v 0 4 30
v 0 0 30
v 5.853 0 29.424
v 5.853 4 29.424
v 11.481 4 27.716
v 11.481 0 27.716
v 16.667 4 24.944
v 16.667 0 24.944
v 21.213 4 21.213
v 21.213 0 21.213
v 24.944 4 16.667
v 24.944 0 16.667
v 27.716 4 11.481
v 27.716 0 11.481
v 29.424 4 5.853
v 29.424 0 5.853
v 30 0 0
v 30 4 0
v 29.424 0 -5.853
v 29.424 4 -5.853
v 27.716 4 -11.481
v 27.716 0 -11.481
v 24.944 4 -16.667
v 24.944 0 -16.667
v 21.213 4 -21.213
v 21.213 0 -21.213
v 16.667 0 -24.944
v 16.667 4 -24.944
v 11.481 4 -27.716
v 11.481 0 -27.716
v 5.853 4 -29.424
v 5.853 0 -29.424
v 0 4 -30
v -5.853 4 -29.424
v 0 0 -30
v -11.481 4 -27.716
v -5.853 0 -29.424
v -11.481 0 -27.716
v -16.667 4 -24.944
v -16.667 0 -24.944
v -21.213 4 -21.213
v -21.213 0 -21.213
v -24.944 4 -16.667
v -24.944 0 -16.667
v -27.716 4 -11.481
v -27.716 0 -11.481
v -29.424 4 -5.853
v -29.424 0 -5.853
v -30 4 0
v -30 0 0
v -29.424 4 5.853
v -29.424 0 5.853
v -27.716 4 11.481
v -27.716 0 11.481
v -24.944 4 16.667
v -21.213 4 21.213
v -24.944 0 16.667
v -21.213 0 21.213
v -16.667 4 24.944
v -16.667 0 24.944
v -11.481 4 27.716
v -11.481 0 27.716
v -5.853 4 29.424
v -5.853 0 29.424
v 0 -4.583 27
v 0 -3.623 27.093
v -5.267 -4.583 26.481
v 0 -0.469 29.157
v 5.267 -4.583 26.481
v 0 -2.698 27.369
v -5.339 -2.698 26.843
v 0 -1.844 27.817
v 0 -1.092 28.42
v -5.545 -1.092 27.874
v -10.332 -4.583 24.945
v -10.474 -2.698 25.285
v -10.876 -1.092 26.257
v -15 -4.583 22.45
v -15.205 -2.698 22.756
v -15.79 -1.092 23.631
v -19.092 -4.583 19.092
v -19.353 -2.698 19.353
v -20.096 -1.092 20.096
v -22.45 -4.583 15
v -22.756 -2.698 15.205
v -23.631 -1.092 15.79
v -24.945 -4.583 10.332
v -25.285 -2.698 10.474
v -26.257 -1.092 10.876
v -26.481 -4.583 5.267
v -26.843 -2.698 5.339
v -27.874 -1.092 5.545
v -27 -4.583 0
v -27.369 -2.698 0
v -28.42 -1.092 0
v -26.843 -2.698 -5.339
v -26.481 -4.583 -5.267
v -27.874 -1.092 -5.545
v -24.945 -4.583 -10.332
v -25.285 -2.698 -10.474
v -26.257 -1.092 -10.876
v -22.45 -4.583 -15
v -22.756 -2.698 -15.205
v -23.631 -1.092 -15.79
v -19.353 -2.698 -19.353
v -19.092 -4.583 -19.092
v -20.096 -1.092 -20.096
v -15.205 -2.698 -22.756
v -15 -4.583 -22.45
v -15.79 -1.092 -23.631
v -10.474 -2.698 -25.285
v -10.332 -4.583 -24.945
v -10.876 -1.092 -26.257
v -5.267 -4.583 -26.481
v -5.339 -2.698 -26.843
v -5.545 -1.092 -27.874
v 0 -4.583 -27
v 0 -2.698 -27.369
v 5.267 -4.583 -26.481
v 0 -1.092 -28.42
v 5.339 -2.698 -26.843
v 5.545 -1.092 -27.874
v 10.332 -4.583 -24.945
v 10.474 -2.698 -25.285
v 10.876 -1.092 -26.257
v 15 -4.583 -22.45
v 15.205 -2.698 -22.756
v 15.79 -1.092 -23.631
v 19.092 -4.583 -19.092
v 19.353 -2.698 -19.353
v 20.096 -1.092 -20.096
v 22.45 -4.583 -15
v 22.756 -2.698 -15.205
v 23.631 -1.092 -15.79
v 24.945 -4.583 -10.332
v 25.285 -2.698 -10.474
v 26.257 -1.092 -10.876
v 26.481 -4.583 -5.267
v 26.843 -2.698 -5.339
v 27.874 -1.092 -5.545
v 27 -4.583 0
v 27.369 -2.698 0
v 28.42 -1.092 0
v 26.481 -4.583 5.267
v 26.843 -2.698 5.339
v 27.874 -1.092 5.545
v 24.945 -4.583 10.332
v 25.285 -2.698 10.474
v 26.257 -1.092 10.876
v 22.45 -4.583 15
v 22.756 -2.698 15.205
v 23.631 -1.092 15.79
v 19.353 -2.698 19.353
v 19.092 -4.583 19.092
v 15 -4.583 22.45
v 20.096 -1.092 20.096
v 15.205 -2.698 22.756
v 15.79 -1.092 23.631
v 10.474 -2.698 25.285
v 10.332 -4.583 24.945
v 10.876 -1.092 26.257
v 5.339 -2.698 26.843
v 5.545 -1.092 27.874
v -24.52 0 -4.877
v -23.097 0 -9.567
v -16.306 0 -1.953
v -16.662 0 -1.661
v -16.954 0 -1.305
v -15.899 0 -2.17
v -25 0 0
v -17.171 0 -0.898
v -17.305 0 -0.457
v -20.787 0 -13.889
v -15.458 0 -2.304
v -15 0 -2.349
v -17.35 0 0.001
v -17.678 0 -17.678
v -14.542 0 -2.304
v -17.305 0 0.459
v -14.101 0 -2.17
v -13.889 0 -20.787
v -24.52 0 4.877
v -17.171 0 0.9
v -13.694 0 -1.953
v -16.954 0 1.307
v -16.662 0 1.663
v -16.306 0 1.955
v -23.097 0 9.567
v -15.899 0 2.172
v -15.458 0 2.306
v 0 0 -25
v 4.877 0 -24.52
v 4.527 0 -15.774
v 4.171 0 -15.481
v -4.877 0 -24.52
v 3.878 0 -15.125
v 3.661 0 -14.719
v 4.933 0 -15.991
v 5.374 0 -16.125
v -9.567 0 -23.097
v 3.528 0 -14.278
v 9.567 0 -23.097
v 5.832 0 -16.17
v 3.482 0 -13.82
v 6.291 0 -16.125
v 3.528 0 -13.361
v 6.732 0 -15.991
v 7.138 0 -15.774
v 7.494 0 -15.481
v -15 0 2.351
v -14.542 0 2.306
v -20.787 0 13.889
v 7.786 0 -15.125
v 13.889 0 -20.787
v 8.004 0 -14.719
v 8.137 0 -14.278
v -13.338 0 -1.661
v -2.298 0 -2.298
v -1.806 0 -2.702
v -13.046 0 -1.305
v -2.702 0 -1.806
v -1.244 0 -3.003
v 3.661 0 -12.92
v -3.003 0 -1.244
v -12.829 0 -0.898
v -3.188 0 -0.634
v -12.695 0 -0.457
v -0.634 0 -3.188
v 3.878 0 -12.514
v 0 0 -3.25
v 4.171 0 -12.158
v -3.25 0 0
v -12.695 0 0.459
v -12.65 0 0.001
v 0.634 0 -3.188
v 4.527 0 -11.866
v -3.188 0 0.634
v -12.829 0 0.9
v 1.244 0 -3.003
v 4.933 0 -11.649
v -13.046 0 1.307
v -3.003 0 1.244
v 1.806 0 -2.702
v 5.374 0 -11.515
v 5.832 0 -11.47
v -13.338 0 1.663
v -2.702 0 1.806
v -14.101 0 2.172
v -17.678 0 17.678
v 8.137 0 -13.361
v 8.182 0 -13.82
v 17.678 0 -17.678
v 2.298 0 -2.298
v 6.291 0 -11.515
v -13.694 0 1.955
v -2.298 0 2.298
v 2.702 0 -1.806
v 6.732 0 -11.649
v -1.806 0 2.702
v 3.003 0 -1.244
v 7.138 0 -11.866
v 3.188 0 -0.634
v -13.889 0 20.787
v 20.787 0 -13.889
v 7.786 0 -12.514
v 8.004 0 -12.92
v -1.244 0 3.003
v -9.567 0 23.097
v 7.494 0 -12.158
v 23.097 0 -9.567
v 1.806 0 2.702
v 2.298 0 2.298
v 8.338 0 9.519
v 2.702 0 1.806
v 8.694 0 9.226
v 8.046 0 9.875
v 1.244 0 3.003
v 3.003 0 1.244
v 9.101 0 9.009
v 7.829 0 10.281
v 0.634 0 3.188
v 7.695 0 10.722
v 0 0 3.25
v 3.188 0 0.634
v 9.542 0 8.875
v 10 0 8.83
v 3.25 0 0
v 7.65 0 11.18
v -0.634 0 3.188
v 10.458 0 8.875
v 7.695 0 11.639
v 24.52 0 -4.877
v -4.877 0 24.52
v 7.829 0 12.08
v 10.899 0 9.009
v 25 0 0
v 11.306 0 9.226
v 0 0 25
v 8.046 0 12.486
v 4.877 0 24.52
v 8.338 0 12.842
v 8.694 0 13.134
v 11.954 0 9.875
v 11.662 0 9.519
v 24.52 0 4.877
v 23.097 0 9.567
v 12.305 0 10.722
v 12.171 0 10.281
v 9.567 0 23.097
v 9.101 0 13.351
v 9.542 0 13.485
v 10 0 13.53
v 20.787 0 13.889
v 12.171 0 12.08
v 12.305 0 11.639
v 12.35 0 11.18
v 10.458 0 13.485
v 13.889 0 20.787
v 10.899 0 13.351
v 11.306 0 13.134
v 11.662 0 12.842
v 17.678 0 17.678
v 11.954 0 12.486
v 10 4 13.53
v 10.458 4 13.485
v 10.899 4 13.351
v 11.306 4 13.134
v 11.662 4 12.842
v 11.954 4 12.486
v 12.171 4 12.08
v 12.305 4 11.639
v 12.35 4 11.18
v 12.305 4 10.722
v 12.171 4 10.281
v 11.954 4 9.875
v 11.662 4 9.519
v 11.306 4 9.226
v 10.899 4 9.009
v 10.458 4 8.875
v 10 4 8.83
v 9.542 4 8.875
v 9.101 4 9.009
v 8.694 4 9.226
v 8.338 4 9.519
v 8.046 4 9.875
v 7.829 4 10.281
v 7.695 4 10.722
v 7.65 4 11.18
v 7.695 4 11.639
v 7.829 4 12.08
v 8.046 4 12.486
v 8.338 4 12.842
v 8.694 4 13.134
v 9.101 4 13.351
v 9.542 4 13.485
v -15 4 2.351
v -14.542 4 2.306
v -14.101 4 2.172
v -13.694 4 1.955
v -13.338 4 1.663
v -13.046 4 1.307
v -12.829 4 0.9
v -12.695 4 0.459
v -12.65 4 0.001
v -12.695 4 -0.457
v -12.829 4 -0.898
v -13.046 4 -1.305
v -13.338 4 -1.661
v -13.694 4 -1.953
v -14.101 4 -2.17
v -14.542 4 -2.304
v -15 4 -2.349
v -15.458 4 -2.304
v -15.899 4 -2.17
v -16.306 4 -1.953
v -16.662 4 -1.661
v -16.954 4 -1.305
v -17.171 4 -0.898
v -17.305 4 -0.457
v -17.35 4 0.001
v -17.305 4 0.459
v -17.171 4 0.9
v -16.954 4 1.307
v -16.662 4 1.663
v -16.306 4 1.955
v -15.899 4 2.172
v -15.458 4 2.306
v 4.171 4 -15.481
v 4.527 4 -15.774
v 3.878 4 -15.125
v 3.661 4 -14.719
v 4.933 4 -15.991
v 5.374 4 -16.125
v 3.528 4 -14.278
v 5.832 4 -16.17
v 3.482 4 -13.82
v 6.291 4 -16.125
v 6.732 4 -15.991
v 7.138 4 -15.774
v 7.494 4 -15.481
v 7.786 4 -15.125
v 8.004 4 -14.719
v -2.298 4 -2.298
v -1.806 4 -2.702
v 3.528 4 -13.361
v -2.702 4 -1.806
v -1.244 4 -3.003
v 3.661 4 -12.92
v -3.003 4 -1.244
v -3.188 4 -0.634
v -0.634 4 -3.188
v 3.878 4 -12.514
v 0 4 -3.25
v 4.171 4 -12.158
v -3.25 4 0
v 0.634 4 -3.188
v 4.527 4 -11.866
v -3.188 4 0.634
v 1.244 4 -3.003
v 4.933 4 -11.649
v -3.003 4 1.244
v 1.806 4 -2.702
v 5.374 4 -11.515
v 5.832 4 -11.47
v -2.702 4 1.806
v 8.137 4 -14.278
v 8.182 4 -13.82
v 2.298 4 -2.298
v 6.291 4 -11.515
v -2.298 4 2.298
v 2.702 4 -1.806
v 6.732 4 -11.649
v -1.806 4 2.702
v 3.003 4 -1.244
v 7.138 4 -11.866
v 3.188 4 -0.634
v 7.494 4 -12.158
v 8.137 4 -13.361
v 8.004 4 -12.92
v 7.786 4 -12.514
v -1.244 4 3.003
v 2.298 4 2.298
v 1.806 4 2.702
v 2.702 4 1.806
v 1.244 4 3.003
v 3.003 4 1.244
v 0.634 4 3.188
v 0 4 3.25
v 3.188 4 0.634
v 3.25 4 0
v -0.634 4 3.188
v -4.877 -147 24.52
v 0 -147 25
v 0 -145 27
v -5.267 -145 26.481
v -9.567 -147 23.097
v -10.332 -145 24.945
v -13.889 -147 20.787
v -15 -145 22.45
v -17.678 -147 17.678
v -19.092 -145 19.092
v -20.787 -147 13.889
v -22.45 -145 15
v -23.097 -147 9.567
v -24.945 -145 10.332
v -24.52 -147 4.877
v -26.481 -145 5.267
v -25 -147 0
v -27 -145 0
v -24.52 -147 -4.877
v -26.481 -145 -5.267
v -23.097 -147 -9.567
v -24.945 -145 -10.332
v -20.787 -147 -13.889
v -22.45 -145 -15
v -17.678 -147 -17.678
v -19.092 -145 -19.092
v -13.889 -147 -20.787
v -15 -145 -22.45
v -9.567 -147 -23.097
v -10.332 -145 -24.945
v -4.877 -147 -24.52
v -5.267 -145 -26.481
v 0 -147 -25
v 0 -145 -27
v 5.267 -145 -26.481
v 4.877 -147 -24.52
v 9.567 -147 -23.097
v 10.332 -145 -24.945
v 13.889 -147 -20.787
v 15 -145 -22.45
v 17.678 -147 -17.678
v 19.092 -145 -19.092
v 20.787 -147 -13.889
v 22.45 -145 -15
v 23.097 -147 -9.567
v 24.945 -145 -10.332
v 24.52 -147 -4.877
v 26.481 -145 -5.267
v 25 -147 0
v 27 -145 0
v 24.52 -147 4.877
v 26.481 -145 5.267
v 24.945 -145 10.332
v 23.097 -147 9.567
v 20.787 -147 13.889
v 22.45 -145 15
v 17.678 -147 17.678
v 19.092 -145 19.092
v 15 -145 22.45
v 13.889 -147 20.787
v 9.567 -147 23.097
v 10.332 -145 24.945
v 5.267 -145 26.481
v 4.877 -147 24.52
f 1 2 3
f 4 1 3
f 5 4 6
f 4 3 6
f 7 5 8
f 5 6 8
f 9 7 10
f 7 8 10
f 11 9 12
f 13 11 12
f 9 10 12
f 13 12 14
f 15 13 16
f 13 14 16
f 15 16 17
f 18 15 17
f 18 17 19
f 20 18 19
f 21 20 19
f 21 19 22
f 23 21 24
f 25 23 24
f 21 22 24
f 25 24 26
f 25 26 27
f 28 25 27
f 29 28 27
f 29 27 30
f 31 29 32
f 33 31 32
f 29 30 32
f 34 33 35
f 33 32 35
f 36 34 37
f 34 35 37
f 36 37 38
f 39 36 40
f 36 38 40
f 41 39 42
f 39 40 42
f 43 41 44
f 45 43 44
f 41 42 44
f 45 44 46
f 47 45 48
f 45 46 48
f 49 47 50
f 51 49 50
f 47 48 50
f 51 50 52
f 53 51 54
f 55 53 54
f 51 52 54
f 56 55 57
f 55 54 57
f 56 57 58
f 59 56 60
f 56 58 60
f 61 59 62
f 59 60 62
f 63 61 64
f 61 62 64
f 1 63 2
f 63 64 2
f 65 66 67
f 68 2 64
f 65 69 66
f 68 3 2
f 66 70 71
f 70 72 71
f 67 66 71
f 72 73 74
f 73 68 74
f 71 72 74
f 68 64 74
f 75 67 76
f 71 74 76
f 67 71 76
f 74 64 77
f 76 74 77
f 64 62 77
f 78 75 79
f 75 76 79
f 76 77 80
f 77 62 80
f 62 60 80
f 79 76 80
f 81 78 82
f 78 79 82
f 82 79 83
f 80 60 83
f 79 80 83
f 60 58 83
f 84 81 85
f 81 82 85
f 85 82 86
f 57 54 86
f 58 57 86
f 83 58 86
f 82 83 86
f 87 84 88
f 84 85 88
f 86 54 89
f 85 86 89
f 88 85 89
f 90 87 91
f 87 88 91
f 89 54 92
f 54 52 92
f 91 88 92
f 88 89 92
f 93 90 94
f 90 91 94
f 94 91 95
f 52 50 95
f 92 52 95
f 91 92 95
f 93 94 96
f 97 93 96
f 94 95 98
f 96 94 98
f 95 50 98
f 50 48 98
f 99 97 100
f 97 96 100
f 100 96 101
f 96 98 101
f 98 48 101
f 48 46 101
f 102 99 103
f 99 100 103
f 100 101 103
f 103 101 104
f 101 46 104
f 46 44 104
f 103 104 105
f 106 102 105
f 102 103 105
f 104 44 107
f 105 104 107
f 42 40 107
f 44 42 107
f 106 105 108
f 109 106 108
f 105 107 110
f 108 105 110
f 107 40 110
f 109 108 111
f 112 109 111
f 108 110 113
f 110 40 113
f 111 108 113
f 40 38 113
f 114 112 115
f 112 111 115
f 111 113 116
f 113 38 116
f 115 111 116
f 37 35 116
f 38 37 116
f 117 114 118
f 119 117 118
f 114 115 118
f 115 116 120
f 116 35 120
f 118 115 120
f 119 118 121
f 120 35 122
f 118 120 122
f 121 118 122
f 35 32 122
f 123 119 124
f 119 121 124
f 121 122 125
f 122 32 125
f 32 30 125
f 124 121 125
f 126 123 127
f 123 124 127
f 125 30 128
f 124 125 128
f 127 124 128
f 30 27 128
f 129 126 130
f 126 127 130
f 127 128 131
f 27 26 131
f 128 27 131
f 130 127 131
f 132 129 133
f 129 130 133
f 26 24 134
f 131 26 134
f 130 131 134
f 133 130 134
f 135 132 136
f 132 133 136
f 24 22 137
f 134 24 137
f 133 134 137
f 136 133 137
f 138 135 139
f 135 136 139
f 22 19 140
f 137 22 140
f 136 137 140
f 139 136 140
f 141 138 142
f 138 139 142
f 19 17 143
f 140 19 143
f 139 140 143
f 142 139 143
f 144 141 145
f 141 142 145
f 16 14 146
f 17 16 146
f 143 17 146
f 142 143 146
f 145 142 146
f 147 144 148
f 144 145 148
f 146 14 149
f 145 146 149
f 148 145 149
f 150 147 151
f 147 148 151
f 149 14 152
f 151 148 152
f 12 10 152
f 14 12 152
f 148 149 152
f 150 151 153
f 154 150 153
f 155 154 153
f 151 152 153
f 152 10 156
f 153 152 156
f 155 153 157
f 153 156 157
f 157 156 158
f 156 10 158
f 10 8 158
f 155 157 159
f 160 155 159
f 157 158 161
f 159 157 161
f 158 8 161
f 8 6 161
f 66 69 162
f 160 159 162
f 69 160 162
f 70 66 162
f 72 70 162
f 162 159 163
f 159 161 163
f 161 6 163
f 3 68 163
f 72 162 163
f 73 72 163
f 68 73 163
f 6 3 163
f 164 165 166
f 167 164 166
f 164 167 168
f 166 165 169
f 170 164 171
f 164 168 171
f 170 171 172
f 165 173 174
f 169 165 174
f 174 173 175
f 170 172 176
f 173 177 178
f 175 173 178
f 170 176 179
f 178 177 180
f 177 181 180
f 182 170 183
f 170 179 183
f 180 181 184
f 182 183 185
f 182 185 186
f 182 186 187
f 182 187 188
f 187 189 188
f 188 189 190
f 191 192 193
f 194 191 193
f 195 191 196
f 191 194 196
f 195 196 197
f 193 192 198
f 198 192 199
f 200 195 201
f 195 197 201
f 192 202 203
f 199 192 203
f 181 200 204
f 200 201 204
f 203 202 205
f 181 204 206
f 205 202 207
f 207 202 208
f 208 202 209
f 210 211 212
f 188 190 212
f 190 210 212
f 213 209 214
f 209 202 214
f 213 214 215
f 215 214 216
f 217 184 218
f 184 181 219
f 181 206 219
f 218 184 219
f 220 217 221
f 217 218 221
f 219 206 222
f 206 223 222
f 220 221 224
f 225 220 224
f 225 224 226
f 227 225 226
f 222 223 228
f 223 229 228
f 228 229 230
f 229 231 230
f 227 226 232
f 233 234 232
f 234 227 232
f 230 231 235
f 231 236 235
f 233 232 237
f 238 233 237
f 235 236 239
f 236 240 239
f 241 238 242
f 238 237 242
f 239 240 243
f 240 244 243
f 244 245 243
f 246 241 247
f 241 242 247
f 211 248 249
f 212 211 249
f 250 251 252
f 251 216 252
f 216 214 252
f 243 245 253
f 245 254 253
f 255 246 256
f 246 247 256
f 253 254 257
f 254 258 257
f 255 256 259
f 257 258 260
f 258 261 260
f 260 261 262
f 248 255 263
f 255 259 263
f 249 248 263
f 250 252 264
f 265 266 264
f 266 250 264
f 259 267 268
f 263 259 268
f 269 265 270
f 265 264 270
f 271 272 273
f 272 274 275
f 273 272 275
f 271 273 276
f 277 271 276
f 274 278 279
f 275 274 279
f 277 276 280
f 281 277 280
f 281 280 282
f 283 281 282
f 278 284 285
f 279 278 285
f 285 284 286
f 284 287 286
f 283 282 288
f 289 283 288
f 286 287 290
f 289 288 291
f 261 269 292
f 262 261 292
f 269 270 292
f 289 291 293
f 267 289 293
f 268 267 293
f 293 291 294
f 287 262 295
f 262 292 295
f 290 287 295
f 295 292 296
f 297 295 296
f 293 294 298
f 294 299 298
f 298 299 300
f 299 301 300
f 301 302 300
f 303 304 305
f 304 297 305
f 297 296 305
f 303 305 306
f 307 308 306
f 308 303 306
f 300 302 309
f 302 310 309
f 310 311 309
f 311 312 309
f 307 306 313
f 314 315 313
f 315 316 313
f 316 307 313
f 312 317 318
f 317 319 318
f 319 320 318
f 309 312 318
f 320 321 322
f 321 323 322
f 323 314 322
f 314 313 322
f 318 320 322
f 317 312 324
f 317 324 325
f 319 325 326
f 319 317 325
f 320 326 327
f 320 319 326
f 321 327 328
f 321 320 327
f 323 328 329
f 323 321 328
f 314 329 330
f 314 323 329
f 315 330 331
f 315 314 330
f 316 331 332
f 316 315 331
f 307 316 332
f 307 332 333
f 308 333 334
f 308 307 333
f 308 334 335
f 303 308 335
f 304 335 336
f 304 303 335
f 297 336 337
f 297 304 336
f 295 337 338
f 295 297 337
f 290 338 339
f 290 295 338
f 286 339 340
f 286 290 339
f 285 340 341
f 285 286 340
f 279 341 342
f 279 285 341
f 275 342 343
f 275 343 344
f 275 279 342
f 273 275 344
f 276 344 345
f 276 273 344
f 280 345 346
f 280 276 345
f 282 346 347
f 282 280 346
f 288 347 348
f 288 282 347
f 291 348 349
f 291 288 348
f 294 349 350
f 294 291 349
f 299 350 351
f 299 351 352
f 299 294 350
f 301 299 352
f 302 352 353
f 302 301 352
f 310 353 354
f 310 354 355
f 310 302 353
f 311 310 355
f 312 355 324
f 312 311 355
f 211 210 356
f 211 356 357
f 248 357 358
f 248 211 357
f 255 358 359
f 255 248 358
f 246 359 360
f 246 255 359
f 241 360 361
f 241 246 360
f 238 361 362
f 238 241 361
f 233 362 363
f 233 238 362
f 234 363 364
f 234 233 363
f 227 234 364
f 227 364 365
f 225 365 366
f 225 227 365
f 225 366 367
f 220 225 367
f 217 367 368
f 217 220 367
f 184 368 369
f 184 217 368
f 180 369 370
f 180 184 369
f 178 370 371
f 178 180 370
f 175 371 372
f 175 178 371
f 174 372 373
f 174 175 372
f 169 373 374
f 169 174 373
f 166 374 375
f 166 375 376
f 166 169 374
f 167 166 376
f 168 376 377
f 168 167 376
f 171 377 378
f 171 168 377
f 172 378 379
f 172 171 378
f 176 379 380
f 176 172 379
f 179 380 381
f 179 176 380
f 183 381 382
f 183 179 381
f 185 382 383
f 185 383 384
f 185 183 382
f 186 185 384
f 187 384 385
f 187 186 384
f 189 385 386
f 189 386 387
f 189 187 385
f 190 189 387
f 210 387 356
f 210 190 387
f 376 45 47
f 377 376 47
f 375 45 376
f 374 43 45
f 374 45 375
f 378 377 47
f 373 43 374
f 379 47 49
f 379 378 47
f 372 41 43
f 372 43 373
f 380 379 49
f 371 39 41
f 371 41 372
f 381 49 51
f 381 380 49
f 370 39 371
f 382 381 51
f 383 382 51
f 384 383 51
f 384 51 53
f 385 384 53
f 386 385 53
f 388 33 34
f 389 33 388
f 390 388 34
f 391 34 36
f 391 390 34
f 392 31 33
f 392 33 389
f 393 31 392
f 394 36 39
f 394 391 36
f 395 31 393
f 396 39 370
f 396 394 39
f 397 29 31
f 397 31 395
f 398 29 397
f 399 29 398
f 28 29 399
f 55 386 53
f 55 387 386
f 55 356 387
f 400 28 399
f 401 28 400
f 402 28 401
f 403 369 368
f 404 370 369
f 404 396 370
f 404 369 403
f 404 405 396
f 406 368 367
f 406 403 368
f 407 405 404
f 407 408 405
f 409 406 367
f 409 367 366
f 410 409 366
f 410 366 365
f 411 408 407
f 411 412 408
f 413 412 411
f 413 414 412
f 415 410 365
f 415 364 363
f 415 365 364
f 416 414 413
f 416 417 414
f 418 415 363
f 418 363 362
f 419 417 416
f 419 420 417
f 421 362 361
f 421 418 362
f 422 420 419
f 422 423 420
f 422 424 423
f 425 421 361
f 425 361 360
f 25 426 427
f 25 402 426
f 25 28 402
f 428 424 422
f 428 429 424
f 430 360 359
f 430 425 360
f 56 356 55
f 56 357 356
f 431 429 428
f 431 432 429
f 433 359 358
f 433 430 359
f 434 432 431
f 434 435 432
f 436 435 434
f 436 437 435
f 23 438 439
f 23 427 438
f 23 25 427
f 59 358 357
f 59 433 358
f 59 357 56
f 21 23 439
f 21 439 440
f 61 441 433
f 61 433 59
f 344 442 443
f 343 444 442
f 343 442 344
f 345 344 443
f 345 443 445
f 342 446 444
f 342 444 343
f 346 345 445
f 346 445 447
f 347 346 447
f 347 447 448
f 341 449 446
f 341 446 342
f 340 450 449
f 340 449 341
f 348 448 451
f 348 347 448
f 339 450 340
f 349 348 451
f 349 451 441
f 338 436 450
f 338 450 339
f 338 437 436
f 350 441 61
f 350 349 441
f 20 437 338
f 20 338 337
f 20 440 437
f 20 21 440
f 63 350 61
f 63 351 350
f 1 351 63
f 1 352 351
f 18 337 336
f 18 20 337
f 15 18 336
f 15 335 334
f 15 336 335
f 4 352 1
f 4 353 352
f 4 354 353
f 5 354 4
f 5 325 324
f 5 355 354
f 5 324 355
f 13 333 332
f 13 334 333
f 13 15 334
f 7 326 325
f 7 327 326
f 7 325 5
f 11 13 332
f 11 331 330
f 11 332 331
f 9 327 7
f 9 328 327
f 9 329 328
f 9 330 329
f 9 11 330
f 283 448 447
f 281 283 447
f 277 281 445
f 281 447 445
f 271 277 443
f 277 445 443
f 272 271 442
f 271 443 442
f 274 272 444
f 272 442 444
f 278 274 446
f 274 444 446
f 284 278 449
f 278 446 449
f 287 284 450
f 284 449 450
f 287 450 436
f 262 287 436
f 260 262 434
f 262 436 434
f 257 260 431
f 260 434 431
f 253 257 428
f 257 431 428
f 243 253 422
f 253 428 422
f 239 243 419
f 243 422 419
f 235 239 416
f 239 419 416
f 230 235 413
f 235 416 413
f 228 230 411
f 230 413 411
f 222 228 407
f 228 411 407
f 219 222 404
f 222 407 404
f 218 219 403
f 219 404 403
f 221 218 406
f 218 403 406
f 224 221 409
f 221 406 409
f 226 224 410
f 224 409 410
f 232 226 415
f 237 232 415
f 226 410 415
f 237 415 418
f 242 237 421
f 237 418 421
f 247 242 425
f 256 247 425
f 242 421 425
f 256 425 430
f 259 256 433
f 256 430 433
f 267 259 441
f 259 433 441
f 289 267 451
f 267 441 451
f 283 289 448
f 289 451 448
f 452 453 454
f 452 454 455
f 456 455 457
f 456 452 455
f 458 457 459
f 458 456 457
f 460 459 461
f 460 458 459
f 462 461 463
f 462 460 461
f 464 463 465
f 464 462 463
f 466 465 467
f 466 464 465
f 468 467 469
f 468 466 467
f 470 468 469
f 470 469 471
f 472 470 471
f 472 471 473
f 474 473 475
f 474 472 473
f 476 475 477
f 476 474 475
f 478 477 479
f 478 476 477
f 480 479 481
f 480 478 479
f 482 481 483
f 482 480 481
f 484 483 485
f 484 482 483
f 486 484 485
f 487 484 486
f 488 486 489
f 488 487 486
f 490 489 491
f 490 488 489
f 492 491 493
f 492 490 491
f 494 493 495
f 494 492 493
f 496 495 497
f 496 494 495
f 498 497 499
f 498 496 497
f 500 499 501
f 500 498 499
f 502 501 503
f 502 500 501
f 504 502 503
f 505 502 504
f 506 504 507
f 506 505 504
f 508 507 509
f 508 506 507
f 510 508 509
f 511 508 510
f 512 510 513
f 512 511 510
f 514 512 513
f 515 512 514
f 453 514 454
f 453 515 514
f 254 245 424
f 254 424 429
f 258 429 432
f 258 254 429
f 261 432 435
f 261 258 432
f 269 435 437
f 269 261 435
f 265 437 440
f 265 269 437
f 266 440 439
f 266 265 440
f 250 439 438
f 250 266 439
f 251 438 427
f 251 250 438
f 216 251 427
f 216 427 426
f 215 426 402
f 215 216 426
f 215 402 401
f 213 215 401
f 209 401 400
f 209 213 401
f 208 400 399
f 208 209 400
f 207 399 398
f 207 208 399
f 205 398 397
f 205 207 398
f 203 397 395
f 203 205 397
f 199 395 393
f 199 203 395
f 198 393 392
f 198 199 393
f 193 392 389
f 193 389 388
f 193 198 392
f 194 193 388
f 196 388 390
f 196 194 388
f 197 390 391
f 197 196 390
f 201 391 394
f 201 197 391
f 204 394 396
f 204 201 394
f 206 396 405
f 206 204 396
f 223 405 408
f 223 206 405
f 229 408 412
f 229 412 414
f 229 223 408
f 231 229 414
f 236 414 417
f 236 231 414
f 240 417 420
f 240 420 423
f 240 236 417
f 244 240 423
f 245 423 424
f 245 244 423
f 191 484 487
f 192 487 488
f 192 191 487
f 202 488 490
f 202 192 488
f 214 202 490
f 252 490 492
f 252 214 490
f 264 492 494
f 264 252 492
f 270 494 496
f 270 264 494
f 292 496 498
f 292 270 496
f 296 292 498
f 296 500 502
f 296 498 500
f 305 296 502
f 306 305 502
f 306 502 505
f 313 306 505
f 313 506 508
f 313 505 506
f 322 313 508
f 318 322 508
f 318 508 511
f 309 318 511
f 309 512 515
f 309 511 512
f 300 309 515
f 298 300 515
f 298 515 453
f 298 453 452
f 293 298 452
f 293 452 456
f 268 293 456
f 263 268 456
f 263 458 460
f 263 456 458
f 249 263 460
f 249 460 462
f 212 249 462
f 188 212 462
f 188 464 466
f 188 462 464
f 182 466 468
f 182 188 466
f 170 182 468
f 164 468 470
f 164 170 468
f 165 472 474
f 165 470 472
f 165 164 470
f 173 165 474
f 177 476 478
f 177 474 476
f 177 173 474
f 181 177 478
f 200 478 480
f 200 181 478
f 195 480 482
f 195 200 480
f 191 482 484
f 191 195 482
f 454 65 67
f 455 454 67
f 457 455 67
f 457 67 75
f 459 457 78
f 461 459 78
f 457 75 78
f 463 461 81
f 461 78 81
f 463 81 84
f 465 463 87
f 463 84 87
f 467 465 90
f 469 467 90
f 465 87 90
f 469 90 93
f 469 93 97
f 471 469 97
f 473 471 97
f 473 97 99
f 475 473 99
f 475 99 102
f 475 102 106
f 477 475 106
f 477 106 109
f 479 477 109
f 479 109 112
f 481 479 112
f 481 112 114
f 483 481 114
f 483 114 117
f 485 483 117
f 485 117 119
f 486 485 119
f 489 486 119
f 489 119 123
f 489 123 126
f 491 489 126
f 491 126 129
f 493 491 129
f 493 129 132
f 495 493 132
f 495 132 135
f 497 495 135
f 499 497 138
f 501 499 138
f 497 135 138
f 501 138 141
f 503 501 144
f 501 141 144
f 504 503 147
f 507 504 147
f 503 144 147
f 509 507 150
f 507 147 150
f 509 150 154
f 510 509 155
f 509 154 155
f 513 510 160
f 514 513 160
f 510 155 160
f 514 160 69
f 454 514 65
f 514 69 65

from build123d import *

# Parameters (mm, degrees)
SKETCH1_R           = 30
SKETCH1_R_2         = 2.35
BOSS_EXTRUDE1_DEPTH = 4
SKETCH2_R           = 3.25
CUT_EXTRUDE1_DEPTH  = 4
SKETCH3_R           = 27
SKETCH3_R_2         = 25
BOSS_EXTRUDE2_DEPTH = 150
CHAMFER1_SIZE       = 5
FILLET1_R           = 5


with BuildPart() as part:
    # Sketch1 → Boss-Extrude1 (new body)
    with BuildSketch(Plane(origin=(0, 0, 0), x_dir=(1, 0, 0), z_dir=(0, 1, 0))):
        with Locations(Location((0, 0, 0), (0, 0, 270))):
            Circle(SKETCH1_R)
        with Locations(Location((-15, -0.001003279, 0), (0, 0, 270))):
            Circle(SKETCH1_R_2, mode=Mode.SUBTRACT)
        with Locations(Location((5.832408968, 13.819660113, 0), (0, 0, 270))):
            Circle(SKETCH1_R_2, mode=Mode.SUBTRACT)
        with Locations(Location((10, -11.180339887, 0), (0, 0, 270))):
            Circle(SKETCH1_R_2, mode=Mode.SUBTRACT)
    extrude(amount=BOSS_EXTRUDE1_DEPTH)

    # Sketch2 → Cut-Extrude1 (cut)
    with BuildSketch(Plane(origin=(0, 4, 0), x_dir=(1, 0, 0), z_dir=(0, 1, 0))):
        with Locations(Location((0, 0, 0), (0, 0, 270))):
            Circle(SKETCH2_R)
    extrude(amount=-CUT_EXTRUDE1_DEPTH, mode=Mode.SUBTRACT)

    # Sketch3 → Boss-Extrude2 (add)
    with BuildSketch(Plane.XZ):
        with Locations(Location((0, 0, 0), (0, 0, 90))):
            Circle(SKETCH3_R)
        with Locations(Location((0, 0, 0), (0, 0, 270))):
            Circle(SKETCH3_R_2, mode=Mode.SUBTRACT)
    extrude(amount=BOSS_EXTRUDE2_DEPTH)

    # Chamfer1
    # the kernel refuses this chamfer: 5 mm, written as the material it takes off along each edge
    with BuildSketch(Plane(origin=(0, -150, 0), x_dir=(0, 0, 1), z_dir=(1, 0, 0))) as chamfer1_piece_1:
        Polygon((27, -CHAMFER1_SIZE), (27 - CHAMFER1_SIZE, 0), (27, 0), align=None)
    revolve(axis=Axis((0, -150, 0), (0, -1, 0)), mode=Mode.SUBTRACT)

    # Fillet1
    # the kernel refuses this fillet: 5 mm, written as the material it adds along each edge
    with BuildSketch(Plane(origin=(0, 0, 0), x_dir=(0, 0, 1), z_dir=(1, 0, 0))) as fillet1_piece_1:
        with BuildLine():
            CenterArc((32, 4.582575695), FILLET1_R, 180, 66.421821522)
            Line((27, 4.582575695), (26.9, 4.582575695))
            Line((26.9, 4.582575695), (26.9, 0))
            Line((26.9, 0), (27, -0.1))
            ThreePointArc((27, -0.1), (28.5, -0.1), (29.96, -0.091651514))
            Line((29.96, -0.091651514), (30, 0))
        make_face()
    revolve(axis=Axis((0, 0, 0), (0, -1, 0)))


solid = part.part
